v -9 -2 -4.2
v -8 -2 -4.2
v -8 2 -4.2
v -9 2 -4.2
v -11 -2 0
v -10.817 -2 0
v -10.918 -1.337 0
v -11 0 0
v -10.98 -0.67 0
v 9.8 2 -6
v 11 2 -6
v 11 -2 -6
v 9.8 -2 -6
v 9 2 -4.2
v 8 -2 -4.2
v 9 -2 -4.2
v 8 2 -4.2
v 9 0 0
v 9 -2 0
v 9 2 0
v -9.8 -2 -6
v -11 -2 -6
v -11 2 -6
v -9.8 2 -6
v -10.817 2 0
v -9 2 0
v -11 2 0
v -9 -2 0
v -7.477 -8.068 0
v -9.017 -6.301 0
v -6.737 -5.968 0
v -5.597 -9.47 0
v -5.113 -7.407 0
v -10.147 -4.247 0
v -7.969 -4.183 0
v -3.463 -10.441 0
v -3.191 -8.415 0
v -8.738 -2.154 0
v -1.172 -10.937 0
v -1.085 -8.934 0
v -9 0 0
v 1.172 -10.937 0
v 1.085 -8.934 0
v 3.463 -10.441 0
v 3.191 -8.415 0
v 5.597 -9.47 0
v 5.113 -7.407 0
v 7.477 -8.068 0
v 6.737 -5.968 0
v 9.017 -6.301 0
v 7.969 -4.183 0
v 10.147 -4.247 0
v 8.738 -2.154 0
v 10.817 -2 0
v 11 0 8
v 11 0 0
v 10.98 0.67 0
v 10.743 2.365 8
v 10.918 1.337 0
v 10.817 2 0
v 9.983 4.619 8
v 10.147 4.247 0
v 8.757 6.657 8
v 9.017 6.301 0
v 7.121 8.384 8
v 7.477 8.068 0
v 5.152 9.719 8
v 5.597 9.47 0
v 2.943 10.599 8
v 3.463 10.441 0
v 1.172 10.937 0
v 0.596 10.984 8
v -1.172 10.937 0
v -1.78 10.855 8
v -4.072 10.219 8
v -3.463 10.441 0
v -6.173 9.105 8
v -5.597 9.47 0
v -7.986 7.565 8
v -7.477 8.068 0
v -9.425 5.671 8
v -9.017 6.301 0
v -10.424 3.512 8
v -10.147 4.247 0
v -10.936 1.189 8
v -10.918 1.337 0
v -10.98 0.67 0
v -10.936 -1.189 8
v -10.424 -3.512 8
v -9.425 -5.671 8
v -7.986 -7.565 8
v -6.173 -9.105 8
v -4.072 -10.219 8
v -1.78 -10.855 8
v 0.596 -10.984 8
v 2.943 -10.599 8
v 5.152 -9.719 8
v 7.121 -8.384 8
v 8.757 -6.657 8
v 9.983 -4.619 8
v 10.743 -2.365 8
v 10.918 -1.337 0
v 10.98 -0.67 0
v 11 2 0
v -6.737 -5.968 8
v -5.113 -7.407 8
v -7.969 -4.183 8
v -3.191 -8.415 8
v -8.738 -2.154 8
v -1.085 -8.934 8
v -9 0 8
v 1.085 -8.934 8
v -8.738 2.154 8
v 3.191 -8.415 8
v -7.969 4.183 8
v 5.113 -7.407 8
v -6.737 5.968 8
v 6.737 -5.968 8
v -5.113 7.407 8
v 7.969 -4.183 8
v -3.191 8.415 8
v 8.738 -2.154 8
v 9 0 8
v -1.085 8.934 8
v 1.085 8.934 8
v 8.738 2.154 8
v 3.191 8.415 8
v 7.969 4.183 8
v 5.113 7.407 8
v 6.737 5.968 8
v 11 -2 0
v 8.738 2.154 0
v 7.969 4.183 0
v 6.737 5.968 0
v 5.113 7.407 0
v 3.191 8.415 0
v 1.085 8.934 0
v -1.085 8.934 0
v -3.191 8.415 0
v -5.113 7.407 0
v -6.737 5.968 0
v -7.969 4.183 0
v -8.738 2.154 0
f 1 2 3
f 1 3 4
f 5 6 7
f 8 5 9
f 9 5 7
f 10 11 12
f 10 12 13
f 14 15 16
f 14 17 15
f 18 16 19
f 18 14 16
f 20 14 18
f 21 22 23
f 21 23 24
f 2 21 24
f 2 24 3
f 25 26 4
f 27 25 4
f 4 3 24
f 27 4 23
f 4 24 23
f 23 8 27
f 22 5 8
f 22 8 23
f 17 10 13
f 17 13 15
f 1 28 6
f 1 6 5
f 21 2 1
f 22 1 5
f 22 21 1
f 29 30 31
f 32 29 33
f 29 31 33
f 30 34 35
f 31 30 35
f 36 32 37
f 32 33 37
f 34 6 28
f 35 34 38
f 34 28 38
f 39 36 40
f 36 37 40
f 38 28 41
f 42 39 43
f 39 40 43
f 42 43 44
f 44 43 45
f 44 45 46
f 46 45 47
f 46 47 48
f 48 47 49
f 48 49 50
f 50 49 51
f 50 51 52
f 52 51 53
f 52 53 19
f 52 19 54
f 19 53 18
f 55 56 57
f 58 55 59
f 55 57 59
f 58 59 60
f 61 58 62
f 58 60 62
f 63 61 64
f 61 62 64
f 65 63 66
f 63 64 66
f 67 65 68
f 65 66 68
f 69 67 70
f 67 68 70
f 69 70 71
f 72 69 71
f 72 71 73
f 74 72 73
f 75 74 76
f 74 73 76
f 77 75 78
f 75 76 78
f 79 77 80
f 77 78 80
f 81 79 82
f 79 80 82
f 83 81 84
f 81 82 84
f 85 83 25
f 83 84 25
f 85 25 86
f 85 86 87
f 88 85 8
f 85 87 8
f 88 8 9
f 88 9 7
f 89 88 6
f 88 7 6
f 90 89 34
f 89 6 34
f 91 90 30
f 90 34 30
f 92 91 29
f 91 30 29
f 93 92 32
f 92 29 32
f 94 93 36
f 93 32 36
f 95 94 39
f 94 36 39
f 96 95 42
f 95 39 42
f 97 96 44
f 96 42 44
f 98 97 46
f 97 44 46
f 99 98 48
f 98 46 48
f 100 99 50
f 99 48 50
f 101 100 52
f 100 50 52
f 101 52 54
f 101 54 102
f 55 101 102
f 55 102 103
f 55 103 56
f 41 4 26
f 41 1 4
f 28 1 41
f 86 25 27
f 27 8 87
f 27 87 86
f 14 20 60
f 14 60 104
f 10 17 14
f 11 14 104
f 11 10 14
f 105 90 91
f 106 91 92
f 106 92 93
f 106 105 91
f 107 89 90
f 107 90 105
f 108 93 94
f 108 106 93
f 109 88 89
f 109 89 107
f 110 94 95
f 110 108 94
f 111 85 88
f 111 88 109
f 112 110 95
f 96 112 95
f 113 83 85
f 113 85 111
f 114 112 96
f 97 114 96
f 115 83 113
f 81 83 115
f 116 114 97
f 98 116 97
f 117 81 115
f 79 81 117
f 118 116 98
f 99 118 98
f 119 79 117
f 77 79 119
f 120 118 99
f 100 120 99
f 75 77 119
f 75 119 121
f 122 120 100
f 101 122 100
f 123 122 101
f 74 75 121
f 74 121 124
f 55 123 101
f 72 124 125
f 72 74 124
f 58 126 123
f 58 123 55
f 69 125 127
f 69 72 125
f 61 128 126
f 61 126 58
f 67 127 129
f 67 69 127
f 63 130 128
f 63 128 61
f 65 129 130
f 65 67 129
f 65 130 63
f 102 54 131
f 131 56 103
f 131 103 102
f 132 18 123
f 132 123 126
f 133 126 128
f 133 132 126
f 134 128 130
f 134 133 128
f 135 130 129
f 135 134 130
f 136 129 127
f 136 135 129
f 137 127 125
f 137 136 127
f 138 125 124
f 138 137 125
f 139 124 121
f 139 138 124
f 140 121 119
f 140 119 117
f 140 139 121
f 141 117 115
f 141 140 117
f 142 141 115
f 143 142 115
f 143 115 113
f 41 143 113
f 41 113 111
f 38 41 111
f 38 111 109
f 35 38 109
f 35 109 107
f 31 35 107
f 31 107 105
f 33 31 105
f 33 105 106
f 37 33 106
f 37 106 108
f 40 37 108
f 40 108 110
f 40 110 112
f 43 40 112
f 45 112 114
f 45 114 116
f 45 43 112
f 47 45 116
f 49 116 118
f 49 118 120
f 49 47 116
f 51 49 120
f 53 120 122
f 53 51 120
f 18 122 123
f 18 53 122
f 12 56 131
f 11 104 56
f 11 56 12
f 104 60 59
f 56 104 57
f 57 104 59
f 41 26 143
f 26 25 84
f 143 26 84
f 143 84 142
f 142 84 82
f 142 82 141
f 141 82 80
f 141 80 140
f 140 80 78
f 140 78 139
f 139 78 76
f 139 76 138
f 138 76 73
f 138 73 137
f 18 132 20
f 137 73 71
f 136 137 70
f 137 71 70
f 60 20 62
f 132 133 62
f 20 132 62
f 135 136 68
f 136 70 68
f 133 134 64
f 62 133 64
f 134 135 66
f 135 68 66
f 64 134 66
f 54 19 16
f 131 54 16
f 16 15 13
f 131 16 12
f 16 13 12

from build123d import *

# Parameters (mm, degrees)
SKETCH1_R           = 11
SKETCH1_R_2         = 9
BOSS_EXTRUDE1_DEPTH = 8
BOSS_EXTRUDE2_DEPTH = 2


with BuildPart() as part:
    # Sketch1 → Boss-Extrude1 (new body)
    with BuildSketch(Plane.XY):
        Circle(SKETCH1_R)
        Circle(SKETCH1_R_2, mode=Mode.SUBTRACT)
    extrude(amount=BOSS_EXTRUDE1_DEPTH)

    # Sketch2 → Boss-Extrude2 (add, symmetric)
    with BuildSketch(Plane(origin=(0, 0, 0), x_dir=(1, 0, 0), z_dir=(0, 1, 0))):
        Polygon((-11, 0), (-11, 6), (-9.8, 6), (-8, 4.2), (-9, 4.2), (-9, 0), align=None)
        Polygon((9, 0), (11, 0), (11, 6), (9.8, 6), (8, 4.2), (9, 4.2), align=None)
    extrude(amount=BOSS_EXTRUDE2_DEPTH, both=True)


solid = part.part
